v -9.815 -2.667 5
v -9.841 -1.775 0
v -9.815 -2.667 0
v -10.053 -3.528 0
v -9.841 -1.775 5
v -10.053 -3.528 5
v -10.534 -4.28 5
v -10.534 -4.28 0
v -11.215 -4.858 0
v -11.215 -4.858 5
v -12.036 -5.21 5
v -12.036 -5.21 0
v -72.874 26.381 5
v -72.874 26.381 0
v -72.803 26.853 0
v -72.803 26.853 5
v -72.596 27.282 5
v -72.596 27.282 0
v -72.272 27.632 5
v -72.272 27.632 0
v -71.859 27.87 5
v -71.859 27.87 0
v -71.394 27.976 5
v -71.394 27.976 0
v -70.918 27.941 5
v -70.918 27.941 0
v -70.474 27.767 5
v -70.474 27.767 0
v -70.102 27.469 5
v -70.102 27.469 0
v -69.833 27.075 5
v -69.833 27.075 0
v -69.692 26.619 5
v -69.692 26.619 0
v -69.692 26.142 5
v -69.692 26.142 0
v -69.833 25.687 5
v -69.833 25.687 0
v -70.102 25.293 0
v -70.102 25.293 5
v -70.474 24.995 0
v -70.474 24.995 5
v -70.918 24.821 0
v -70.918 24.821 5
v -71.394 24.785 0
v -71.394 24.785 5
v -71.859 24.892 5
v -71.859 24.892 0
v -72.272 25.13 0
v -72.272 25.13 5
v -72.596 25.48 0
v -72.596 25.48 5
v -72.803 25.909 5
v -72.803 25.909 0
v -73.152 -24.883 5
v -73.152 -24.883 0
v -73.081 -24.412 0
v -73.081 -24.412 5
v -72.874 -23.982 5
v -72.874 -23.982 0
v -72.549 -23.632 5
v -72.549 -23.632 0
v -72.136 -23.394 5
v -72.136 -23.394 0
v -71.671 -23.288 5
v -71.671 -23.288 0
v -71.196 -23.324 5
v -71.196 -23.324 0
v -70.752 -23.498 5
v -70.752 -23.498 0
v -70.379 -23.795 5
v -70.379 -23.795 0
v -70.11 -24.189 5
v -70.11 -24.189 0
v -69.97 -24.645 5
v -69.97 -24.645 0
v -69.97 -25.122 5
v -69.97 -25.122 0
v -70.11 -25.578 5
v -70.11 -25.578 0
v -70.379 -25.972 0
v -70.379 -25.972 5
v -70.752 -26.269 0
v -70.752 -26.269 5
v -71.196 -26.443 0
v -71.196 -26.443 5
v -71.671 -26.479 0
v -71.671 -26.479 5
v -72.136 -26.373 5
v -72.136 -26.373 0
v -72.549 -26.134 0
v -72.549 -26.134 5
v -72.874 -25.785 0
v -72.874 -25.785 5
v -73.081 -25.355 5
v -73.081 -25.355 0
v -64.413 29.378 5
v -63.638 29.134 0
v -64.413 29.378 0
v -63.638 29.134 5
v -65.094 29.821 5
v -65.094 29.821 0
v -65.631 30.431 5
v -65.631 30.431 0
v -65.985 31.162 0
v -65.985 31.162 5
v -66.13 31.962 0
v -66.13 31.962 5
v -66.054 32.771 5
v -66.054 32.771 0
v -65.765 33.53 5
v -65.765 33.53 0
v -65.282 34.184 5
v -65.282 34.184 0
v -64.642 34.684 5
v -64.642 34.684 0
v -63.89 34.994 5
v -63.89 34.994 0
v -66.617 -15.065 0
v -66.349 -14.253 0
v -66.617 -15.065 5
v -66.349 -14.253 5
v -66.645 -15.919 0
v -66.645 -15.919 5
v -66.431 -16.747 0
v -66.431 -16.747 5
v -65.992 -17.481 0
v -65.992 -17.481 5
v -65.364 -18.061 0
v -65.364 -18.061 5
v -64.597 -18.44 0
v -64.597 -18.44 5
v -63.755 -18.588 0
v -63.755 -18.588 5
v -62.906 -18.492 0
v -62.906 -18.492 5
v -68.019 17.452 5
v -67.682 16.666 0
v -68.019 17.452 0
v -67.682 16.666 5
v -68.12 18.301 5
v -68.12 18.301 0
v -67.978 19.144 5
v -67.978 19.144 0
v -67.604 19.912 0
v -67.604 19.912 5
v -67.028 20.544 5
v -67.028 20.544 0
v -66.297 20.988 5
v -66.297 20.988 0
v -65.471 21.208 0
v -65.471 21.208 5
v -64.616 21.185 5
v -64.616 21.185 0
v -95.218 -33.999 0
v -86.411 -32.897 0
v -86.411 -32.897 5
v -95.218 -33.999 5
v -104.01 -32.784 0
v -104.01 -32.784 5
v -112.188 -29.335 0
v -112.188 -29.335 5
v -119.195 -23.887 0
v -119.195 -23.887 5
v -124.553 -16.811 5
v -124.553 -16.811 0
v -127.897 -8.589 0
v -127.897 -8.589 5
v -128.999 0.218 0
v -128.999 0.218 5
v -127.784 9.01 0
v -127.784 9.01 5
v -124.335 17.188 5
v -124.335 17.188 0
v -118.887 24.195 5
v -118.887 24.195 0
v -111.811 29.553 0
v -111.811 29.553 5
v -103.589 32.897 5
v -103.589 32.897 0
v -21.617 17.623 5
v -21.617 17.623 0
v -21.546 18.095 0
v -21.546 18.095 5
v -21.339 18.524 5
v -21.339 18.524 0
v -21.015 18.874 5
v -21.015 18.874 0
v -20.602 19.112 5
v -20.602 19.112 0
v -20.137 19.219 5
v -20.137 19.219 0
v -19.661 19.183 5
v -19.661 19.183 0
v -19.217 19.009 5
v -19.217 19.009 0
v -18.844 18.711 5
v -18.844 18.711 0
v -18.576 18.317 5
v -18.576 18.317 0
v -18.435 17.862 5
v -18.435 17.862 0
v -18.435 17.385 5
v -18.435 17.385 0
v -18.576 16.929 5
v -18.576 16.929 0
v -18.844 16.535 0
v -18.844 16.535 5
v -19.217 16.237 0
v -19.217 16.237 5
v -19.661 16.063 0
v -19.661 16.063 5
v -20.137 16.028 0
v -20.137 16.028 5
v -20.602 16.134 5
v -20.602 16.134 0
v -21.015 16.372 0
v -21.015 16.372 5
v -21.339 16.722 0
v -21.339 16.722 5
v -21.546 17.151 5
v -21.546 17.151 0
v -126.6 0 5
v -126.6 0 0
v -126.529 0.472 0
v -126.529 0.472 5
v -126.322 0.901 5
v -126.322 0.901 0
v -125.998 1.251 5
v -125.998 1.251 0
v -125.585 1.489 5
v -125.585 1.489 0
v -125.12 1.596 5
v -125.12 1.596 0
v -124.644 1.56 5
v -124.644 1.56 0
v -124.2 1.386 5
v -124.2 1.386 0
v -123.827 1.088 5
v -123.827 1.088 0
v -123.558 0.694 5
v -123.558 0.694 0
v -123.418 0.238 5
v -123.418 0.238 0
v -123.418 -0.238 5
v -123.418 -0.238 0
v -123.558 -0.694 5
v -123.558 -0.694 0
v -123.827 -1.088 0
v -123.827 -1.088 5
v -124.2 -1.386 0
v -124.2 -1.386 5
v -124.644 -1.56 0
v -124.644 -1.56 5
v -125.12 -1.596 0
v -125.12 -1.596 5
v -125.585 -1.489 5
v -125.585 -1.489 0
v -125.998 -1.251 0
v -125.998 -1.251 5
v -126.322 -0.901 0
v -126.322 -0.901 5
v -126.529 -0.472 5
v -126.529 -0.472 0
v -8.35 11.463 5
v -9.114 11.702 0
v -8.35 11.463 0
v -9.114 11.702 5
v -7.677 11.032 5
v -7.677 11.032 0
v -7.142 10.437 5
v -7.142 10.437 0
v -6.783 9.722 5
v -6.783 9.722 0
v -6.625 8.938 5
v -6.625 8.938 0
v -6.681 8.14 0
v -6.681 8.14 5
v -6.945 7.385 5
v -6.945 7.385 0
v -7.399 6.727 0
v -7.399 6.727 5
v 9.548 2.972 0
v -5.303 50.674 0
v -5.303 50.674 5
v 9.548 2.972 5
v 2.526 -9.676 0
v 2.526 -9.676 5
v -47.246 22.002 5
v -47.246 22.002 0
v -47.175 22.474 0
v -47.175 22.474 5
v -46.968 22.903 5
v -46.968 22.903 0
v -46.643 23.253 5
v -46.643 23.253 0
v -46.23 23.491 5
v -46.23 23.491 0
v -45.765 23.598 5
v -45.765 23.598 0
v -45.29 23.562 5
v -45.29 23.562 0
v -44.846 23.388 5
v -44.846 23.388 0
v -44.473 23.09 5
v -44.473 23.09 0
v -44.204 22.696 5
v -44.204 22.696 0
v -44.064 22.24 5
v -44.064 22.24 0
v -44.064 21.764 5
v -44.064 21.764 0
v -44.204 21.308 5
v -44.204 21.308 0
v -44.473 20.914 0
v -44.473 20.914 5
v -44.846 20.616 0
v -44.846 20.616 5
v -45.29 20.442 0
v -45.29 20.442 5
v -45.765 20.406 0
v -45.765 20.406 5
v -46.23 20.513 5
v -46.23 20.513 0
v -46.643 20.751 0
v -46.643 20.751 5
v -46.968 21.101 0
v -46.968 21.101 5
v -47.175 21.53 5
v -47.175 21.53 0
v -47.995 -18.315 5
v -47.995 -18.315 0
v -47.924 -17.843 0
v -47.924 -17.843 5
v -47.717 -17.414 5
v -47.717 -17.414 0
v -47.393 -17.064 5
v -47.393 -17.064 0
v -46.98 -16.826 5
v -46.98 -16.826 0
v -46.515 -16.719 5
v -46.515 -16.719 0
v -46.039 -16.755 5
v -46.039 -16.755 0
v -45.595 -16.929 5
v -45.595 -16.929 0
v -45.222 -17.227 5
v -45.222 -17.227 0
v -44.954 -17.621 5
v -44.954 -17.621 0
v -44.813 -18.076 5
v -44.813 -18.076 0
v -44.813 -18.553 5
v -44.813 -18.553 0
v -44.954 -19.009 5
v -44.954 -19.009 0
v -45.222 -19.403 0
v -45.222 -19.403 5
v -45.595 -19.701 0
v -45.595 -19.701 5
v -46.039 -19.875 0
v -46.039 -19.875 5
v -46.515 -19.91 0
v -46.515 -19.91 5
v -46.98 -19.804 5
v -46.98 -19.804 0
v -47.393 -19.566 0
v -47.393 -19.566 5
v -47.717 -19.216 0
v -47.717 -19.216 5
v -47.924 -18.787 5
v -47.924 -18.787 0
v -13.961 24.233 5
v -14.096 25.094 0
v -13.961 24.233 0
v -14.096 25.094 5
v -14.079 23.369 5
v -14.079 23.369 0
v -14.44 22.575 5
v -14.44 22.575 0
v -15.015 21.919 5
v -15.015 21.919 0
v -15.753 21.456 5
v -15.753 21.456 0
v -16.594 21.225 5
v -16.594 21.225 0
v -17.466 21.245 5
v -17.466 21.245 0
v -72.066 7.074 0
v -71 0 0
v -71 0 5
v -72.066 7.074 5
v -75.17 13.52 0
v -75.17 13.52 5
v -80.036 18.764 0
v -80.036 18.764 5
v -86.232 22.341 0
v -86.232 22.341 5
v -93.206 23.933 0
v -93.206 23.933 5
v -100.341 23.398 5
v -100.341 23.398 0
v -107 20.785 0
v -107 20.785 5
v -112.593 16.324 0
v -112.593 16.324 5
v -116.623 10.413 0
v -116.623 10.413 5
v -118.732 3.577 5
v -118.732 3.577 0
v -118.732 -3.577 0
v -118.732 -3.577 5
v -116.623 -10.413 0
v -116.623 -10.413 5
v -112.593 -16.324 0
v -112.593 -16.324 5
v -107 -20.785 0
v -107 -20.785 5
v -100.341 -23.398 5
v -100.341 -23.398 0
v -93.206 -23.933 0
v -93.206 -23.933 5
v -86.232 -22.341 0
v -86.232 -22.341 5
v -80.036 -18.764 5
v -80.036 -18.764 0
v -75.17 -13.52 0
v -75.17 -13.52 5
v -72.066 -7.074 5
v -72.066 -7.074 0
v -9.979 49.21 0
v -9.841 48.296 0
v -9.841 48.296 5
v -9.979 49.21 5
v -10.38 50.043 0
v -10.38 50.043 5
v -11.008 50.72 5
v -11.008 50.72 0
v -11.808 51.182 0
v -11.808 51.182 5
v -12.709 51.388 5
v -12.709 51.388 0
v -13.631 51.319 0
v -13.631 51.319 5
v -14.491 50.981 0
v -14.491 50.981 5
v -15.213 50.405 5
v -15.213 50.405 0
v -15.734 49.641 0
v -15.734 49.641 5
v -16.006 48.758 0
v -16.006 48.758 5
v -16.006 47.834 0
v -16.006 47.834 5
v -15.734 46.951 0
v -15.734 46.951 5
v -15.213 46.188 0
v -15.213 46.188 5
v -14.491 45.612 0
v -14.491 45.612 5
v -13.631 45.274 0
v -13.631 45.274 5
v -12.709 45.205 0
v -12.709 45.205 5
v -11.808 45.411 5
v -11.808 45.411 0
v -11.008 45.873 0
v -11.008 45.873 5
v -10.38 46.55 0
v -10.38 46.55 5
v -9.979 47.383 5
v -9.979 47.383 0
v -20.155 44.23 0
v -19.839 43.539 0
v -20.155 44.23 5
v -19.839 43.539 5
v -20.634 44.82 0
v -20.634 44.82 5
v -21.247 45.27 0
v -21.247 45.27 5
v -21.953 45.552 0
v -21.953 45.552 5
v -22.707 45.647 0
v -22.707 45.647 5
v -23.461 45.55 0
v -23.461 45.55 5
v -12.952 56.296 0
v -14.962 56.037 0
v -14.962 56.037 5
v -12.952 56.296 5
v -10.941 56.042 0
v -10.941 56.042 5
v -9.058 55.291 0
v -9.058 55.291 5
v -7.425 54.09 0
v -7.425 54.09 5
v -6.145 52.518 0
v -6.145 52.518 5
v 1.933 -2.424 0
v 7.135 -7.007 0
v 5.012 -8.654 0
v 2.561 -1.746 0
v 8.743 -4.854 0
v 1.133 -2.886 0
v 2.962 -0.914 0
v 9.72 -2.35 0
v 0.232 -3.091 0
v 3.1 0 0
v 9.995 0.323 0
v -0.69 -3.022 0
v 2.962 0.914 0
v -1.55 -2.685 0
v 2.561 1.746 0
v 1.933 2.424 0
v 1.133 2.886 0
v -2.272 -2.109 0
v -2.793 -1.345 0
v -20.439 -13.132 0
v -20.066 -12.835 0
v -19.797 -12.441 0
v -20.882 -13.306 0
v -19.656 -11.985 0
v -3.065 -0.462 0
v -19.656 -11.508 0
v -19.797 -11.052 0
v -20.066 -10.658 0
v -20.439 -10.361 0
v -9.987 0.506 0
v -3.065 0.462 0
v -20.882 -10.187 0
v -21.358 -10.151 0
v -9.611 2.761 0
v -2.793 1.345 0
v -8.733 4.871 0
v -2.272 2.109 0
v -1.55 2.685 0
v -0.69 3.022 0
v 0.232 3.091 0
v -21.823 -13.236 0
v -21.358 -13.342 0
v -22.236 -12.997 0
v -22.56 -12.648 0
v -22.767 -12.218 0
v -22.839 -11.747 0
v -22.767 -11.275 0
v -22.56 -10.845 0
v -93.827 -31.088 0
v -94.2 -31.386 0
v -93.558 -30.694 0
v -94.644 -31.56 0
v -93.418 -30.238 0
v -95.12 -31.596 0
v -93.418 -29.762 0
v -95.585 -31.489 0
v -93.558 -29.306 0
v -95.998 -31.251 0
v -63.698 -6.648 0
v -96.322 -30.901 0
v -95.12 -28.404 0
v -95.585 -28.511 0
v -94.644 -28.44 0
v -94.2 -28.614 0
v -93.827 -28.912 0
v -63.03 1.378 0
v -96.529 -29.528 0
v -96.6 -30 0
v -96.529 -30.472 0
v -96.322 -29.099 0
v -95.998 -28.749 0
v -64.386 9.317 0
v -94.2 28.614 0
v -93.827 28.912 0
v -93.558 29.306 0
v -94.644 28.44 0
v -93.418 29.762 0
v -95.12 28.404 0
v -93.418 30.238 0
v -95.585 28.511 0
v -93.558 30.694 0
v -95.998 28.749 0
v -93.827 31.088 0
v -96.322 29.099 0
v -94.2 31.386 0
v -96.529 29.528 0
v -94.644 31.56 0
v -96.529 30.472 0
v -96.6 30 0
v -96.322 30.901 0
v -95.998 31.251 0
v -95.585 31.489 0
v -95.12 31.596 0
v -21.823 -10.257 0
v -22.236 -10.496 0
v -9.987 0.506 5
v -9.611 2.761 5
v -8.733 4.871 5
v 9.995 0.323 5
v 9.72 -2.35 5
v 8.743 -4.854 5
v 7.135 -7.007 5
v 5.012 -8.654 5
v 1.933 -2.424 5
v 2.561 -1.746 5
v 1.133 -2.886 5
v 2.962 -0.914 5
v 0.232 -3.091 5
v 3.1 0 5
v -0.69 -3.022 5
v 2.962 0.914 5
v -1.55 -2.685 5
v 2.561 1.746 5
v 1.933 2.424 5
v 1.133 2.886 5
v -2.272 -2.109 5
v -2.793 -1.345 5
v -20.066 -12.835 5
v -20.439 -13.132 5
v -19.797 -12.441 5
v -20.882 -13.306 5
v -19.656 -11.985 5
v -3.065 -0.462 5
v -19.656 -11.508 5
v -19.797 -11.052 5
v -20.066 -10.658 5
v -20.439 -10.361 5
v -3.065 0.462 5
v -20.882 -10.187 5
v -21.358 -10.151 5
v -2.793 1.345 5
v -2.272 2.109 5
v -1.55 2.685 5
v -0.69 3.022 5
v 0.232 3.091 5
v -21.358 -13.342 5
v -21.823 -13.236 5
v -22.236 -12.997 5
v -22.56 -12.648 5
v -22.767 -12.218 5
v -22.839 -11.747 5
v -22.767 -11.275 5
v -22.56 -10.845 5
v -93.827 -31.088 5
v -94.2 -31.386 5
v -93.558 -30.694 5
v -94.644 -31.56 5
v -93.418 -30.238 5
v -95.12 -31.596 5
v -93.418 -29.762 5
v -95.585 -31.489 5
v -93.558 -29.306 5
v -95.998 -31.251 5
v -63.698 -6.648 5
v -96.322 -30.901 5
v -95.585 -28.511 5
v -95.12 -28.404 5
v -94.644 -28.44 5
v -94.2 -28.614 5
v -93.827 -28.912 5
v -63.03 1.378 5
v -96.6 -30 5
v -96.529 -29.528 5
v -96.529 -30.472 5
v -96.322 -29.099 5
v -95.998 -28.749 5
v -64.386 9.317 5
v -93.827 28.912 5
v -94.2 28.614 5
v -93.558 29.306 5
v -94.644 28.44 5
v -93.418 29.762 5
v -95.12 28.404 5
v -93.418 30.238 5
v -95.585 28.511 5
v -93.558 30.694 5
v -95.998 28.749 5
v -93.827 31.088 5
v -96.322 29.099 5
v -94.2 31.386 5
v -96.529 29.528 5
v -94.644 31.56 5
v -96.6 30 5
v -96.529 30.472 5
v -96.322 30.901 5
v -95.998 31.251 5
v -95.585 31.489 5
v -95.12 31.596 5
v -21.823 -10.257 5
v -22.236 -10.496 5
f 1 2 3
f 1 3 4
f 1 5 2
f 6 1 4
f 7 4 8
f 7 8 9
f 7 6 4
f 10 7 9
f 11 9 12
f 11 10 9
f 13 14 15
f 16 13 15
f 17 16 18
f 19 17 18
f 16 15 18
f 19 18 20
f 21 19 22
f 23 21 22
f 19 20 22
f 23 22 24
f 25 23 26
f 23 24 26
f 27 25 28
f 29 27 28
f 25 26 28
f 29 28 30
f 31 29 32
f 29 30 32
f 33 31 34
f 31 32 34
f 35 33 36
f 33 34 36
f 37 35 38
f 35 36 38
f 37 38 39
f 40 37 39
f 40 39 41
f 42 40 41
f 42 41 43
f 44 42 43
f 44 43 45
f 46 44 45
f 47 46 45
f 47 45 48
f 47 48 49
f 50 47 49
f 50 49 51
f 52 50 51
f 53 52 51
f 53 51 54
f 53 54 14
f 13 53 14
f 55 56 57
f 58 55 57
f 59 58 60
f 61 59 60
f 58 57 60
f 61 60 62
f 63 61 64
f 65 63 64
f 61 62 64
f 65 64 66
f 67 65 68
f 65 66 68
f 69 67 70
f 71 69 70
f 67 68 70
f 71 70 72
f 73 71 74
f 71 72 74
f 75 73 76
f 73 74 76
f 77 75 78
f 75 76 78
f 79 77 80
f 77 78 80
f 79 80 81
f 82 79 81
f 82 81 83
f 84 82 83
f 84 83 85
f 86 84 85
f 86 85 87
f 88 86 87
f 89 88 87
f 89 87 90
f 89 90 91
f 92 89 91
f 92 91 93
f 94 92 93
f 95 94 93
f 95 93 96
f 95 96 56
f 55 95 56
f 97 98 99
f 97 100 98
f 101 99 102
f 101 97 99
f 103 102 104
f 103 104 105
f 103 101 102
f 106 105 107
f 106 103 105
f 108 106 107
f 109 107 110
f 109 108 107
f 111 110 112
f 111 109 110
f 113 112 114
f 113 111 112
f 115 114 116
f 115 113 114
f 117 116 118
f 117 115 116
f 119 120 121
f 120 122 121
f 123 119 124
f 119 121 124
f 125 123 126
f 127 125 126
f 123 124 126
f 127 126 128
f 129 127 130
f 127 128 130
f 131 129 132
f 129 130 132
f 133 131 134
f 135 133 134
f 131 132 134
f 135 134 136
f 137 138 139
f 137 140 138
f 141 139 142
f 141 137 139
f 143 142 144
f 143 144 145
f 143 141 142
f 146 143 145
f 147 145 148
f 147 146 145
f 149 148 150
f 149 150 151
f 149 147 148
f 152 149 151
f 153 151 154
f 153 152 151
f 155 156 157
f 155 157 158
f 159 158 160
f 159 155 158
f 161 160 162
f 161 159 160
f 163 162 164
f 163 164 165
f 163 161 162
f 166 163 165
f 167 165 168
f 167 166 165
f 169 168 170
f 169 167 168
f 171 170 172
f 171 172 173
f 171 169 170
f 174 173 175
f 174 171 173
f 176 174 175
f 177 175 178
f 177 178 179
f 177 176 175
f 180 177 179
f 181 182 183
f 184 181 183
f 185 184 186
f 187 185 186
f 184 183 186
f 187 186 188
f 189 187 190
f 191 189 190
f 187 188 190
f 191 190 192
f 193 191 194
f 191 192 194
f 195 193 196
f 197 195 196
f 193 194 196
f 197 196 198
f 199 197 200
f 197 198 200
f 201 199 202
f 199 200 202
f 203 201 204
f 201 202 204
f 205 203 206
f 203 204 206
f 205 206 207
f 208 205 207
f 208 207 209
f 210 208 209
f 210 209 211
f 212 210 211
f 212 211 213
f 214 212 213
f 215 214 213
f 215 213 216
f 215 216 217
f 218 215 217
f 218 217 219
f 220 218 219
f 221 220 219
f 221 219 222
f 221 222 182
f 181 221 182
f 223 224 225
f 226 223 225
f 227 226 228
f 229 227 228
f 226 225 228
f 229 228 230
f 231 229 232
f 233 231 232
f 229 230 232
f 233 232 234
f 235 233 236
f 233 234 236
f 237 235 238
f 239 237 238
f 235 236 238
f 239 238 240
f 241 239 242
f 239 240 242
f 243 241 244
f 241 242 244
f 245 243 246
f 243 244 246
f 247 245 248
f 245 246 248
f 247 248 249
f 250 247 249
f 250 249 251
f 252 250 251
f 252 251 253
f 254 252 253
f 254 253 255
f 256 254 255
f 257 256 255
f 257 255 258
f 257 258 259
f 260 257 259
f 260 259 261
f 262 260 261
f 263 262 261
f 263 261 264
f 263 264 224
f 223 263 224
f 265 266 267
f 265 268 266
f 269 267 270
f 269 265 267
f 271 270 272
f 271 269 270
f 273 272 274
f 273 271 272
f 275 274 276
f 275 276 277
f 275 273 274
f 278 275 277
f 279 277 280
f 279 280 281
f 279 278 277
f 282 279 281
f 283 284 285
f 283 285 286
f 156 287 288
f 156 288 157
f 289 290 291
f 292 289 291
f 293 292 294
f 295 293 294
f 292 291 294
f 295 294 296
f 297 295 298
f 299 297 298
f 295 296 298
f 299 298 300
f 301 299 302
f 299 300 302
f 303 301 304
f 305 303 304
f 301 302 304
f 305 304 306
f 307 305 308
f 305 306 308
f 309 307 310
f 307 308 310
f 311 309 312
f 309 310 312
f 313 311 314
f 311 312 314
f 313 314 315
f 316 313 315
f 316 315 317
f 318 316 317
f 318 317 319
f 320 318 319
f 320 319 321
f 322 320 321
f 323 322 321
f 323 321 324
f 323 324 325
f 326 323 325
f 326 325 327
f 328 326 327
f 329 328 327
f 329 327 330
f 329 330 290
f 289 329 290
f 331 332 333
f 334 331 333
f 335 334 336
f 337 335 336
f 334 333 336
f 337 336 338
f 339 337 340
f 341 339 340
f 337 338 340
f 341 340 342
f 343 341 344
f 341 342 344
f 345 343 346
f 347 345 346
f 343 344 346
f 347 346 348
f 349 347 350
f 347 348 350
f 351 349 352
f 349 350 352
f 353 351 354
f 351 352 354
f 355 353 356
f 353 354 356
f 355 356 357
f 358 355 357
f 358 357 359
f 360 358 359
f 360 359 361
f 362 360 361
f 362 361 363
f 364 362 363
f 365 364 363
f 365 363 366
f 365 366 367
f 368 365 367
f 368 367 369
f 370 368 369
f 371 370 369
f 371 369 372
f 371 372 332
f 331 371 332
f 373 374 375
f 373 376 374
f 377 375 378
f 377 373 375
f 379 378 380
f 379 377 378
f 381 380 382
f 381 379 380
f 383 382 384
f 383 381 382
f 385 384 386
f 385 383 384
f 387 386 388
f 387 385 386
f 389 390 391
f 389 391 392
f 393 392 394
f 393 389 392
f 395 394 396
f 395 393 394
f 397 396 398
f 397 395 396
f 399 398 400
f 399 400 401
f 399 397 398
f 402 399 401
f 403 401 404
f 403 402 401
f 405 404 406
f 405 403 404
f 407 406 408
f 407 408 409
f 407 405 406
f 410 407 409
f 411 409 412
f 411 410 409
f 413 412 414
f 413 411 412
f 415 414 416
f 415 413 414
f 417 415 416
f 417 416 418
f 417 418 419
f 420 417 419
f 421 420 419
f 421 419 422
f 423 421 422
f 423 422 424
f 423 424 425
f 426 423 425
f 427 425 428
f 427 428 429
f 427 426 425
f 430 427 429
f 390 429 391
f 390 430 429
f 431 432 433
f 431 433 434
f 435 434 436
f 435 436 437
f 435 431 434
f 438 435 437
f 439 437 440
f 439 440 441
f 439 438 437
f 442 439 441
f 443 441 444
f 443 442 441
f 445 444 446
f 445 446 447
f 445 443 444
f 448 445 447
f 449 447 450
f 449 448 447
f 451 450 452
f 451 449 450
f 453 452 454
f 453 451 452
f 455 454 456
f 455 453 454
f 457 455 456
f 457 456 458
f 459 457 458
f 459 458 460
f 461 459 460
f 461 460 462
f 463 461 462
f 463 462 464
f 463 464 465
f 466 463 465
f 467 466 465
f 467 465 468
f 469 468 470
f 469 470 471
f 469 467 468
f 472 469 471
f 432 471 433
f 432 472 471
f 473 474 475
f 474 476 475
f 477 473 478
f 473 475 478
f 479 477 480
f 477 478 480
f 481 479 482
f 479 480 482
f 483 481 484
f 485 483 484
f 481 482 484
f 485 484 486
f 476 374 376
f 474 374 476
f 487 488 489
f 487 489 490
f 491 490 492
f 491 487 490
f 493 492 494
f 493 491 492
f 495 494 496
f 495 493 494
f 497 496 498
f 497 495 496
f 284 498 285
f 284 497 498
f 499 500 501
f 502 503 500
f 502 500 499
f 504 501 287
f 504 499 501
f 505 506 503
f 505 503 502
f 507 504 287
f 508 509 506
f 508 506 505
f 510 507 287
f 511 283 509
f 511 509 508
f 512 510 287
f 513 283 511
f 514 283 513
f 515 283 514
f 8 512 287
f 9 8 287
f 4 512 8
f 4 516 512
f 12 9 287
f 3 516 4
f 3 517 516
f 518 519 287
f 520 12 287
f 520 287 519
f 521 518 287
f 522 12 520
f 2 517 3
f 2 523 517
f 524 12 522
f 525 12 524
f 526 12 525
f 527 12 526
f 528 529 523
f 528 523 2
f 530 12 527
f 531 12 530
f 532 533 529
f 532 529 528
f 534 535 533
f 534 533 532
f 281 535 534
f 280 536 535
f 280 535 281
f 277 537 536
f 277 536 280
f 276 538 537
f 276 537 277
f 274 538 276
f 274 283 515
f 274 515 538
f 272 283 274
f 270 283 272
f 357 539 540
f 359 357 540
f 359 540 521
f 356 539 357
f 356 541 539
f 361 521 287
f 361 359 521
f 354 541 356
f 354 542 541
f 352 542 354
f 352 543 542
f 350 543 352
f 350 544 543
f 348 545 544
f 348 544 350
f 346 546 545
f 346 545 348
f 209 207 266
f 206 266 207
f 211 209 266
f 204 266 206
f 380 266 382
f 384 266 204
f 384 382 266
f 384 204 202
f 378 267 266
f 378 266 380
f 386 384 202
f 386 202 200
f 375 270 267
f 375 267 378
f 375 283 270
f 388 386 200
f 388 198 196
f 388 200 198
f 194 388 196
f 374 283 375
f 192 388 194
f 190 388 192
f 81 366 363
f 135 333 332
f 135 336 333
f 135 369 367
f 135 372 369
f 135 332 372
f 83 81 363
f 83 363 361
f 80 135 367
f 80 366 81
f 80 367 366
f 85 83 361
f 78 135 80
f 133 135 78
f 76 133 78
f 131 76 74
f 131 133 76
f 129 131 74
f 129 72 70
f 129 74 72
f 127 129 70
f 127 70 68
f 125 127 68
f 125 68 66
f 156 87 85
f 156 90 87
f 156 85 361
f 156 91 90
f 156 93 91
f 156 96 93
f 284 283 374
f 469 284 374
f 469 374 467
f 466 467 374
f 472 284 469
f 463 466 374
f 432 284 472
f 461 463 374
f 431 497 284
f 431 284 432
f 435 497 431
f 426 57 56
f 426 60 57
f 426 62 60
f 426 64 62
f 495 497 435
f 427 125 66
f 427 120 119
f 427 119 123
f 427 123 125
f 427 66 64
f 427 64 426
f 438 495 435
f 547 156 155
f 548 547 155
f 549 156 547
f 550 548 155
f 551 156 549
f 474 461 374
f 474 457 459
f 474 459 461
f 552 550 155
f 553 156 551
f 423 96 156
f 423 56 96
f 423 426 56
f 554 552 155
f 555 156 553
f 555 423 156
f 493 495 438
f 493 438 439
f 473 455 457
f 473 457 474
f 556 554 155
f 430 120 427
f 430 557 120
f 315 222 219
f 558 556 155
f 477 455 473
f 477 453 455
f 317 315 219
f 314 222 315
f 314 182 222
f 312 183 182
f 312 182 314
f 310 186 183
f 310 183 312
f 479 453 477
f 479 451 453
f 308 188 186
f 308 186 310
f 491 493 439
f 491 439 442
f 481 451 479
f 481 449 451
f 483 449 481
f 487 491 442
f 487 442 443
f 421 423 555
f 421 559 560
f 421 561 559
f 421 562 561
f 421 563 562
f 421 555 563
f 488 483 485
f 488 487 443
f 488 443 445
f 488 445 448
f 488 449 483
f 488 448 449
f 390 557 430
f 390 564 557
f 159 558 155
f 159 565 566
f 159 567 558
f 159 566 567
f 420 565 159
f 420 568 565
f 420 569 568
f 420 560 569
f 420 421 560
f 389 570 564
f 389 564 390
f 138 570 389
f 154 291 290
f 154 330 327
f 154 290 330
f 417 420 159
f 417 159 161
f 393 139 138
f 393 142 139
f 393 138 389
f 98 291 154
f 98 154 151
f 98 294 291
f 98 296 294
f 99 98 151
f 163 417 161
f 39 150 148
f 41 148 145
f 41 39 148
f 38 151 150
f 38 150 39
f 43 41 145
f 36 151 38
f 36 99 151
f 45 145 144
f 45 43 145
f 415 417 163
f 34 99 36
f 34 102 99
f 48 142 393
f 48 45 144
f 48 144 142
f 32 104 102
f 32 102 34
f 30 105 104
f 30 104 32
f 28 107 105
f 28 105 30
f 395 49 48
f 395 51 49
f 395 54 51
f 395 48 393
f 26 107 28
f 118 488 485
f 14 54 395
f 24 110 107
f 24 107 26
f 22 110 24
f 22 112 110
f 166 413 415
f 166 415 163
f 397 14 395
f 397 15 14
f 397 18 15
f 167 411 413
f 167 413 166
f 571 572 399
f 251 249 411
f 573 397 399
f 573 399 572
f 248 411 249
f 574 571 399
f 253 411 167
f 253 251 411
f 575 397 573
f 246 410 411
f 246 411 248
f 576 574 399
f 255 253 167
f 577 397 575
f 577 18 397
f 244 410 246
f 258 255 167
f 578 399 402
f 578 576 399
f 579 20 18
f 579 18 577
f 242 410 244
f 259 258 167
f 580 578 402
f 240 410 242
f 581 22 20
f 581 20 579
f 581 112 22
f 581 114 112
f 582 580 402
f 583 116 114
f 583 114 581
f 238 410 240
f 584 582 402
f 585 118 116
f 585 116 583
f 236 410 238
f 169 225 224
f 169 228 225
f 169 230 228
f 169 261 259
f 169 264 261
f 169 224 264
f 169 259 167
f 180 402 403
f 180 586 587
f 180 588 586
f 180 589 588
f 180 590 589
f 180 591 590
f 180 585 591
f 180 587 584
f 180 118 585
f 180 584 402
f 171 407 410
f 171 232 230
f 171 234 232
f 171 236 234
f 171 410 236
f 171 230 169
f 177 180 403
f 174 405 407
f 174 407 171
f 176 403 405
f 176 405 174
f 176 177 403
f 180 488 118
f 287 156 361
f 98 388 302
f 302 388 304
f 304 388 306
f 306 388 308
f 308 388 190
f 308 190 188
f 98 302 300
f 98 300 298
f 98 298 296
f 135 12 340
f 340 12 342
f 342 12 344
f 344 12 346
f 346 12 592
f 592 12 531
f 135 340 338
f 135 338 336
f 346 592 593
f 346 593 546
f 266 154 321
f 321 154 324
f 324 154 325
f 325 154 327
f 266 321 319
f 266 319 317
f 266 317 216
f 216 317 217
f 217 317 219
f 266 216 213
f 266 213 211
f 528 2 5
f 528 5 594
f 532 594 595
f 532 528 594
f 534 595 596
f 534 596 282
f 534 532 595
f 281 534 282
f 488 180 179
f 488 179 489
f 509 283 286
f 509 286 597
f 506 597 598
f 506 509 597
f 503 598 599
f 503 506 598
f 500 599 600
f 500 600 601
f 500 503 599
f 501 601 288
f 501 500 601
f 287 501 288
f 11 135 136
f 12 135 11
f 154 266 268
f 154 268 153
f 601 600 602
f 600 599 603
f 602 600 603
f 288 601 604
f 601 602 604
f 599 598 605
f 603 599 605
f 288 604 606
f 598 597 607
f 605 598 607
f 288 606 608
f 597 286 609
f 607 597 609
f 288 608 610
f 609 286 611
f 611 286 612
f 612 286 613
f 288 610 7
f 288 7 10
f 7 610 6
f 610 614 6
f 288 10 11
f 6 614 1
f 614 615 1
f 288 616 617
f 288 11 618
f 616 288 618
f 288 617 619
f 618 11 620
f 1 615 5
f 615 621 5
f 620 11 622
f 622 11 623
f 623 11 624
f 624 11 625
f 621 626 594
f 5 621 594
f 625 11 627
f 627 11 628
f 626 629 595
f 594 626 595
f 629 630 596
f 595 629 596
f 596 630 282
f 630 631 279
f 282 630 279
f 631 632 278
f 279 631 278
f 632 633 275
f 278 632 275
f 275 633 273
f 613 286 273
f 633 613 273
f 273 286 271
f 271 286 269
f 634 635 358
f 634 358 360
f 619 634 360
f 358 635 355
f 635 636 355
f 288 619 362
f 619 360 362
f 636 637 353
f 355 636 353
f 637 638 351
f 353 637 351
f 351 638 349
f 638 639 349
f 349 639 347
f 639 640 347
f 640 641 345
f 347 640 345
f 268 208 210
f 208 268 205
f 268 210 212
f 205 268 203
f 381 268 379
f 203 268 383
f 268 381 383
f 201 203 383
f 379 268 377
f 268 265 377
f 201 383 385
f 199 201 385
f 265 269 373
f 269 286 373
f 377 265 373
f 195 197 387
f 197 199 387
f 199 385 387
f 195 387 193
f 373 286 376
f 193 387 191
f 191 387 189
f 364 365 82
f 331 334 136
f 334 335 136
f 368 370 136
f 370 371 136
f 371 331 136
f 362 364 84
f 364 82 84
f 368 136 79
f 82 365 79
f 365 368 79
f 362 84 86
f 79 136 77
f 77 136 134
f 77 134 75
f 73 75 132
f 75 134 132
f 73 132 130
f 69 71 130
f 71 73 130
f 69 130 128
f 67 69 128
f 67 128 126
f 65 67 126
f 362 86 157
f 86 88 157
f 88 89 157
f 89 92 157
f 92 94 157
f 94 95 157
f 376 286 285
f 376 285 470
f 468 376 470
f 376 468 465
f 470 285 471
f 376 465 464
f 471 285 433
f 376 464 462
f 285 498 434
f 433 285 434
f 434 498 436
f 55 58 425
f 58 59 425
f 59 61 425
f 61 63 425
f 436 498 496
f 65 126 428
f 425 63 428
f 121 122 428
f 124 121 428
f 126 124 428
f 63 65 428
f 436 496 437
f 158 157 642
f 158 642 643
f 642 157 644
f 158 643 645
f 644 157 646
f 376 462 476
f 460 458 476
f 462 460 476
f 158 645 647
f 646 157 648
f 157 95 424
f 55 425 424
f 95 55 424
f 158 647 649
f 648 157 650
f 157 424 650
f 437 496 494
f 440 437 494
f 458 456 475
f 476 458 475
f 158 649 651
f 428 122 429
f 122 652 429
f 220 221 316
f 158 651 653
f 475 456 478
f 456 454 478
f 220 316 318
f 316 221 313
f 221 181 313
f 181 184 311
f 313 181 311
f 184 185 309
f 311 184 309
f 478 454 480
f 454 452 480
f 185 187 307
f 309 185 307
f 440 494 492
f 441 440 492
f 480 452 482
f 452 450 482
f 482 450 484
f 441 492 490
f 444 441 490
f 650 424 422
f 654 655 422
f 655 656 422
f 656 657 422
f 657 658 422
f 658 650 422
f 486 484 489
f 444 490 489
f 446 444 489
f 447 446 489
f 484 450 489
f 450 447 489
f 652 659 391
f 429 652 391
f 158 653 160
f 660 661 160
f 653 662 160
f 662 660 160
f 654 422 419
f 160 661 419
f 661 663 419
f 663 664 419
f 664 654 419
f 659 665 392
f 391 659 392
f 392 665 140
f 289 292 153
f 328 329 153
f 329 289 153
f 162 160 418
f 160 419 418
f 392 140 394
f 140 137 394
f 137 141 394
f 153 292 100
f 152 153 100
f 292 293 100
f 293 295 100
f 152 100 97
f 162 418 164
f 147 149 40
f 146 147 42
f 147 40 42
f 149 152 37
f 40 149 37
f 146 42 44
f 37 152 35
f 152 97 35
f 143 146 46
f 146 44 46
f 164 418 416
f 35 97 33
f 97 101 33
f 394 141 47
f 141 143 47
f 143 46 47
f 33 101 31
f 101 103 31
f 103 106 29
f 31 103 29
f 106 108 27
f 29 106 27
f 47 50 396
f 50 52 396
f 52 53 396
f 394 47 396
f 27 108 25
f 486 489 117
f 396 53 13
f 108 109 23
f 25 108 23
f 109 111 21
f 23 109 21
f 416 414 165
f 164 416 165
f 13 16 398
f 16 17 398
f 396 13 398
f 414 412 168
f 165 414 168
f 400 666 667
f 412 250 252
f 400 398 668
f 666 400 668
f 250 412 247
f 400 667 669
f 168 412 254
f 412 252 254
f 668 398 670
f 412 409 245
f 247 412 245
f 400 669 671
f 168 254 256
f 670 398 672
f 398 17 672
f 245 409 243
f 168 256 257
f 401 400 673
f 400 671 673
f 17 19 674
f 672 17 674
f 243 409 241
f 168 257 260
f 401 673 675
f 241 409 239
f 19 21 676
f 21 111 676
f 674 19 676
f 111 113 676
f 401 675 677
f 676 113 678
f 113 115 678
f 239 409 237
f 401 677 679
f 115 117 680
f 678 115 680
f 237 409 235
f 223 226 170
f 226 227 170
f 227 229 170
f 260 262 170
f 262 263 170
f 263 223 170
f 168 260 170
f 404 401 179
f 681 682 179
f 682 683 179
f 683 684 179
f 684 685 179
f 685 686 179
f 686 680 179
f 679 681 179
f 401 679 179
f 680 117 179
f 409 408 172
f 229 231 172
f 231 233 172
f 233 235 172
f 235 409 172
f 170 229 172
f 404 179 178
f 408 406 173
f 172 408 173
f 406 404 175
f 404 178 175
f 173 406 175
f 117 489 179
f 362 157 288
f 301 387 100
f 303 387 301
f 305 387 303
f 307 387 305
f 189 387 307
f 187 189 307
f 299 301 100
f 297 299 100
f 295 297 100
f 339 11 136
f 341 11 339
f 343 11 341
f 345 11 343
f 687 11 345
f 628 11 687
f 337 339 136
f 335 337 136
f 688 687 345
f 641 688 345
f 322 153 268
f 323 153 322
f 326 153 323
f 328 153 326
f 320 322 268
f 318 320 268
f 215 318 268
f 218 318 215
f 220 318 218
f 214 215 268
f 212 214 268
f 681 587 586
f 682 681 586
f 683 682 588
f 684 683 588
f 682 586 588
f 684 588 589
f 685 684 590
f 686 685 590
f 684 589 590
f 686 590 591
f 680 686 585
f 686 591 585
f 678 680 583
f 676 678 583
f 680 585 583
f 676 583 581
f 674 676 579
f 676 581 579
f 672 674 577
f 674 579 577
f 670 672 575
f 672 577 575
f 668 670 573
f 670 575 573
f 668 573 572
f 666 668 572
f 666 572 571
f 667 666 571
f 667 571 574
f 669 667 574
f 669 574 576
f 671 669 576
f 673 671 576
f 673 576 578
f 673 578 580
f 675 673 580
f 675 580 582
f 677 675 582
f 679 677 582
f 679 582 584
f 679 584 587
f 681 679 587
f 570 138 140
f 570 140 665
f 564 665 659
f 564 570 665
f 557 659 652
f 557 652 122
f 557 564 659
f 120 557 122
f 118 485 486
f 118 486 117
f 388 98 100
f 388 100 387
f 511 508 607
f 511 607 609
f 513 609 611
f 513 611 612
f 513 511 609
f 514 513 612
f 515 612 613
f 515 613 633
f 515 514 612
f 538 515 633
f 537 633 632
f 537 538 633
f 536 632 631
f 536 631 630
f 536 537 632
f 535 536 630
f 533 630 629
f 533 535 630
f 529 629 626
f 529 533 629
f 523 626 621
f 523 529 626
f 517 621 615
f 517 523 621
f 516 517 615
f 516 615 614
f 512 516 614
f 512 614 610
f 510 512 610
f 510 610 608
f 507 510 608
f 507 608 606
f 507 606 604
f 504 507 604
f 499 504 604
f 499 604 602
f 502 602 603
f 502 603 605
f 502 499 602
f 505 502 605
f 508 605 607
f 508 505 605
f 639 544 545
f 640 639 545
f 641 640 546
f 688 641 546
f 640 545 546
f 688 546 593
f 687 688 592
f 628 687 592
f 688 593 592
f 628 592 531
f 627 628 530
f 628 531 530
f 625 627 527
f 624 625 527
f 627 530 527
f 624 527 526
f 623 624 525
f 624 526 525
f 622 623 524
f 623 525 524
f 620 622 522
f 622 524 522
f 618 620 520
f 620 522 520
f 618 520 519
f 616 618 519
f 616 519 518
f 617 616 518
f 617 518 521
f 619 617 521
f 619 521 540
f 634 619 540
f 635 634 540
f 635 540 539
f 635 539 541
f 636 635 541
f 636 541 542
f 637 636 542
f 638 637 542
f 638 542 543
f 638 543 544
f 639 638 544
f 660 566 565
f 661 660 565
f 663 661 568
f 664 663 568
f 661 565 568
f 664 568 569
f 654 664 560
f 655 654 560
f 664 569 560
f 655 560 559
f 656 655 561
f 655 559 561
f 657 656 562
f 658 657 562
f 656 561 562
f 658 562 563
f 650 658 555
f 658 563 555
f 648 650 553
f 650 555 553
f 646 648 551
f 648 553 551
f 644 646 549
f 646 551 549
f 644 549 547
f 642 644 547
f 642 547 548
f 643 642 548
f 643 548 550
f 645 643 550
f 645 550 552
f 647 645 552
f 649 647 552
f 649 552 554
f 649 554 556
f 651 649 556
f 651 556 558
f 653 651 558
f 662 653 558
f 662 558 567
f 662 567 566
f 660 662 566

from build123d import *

# Parameters (mm, degrees)
SKETCH_1_R          = 3.1
SKETCH_1_R_2        = 24
EXTRUDE_1_DEPTH     = 5
SKETCH_2_R          = 1.6
CUT_EXTRUDE_1_DEPTH = 44
CUT_EXTRUDE_2_DEPTH = 34
FILLET_1_R          = 3
CUT_EXTRUDE_3_DEPTH = 34
FILLET_2_R          = 3


with BuildPart() as part:
    # 草图1 → 凸台-拉伸1 (new body)
    with BuildSketch(Plane.XY):
        with BuildLine():
            Line((-103.589105886, 32.89722268), (-14.961918346, 56.036814298))
            ThreePointArc((-14.961918346, 56.036814298), (-9.057902271, 55.29071215), (-5.302552139, 50.674282835))
            Line((-5.302552139, 50.674282835), (9.548000145, 2.9724894))
            ThreePointArc((9.548000145, 2.9724894), (8.743053177, -4.853763606), (2.526315789, -9.675625485))
            Line((2.526315789, -9.675625485), (-86.410526316, -32.89712665))
            ThreePointArc((-86.410526316, -32.89712665), (-127.897174666, -8.589289785), (-103.589105886, 32.89722268))
        make_face()
        Circle(SKETCH_1_R, mode=Mode.SUBTRACT)
        with Locations((-95, 0)):
            Circle(SKETCH_1_R_2, mode=Mode.SUBTRACT)
        with Locations((-12.940952255, 48.296291314)):
            Circle(SKETCH_1_R, mode=Mode.SUBTRACT)
    extrude(amount=EXTRUDE_1_DEPTH)

    # 草图2 → 切除-拉伸1 (cut)
    with BuildSketch(Plane(origin=(0, 0, 0), x_dir=(-1, 0, 0), z_dir=(0, 0, -1))):
        with Locations((21.238501013, -11.746543996)):
            Circle(SKETCH_2_R)
        with Locations((46.395127275, -18.314965049)):
            Circle(SKETCH_2_R)
        with Locations((71.551753537, -24.883386101)):
            Circle(SKETCH_2_R)
        with Locations((95, -30)):
            Circle(SKETCH_2_R)
        with Locations((125, 0)):
            Circle(SKETCH_2_R)
        with Locations((95, 30)):
            Circle(SKETCH_2_R)
        with Locations((71.274432107, 26.380963088)):
            Circle(SKETCH_2_R)
        with Locations((45.645838312, 22.002015719)):
            Circle(SKETCH_2_R)
        with Locations((20.017244516, 17.623068351)):
            Circle(SKETCH_2_R)
    extrude(amount=-CUT_EXTRUDE_1_DEPTH, mode=Mode.SUBTRACT)

    # 草图3 → 切除-拉伸2 (cut)
    with BuildSketch(Plane(origin=(0, 0, 0), x_dir=(-1, 0, 0), z_dir=(0, 0, -1))):
        with BuildLine():
            Line((70.381933652, -20.443845267), (8.974874995, -4.410398942))
            ThreePointArc((8.974874995, -4.410398942), (8.011191904, 5.985048394), (-1.684210526, 9.85715146))
            Line((-1.684210526, 9.85715146), (72.232775022, 22.486739799))
            ThreePointArc((72.232775022, 22.486739799), (63.029697498, 1.378317076), (70.381933652, -20.443845267))
        make_face()
    extrude(amount=-CUT_EXTRUDE_2_DEPTH, mode=Mode.SUBTRACT)

    # 圆角1
    fillet_1_edges = [part.edges().sort_by_distance(p)[0] for p in [
        (-8.974874995, -4.410398942, 2.5),
        (1.684210526, 9.85715146, 2.5),
        (-72.232775022, 22.486739799, 2.5),
        (-70.381933652, -20.443845267, 2.5),
    ]]
    fillet(fillet_1_edges, radius=FILLET_1_R)

    # 草图4 → 切除-拉伸3 (cut)
    with BuildSketch(Plane(origin=(0, 0, 0), x_dir=(-1, 0, 0), z_dir=(0, 0, -1))):
        Polygon((20.689823209, 46.27314566), (77.356433109, 31.478112128), (12.641453143, 20.420794919), align=None)
    extrude(amount=-CUT_EXTRUDE_3_DEPTH, mode=Mode.SUBTRACT)

    # 圆角2
    fillet_2_edges = [part.edges().sort_by_distance(p)[0] for p in [
        (-12.641453143, 20.420794919, 2.5),
        (-20.689823209, 46.27314566, 2.5),
        (-77.356433109, 31.478112128, 2.5),
    ]]
    fillet(fillet_2_edges, radius=FILLET_2_R)


solid = part.part
